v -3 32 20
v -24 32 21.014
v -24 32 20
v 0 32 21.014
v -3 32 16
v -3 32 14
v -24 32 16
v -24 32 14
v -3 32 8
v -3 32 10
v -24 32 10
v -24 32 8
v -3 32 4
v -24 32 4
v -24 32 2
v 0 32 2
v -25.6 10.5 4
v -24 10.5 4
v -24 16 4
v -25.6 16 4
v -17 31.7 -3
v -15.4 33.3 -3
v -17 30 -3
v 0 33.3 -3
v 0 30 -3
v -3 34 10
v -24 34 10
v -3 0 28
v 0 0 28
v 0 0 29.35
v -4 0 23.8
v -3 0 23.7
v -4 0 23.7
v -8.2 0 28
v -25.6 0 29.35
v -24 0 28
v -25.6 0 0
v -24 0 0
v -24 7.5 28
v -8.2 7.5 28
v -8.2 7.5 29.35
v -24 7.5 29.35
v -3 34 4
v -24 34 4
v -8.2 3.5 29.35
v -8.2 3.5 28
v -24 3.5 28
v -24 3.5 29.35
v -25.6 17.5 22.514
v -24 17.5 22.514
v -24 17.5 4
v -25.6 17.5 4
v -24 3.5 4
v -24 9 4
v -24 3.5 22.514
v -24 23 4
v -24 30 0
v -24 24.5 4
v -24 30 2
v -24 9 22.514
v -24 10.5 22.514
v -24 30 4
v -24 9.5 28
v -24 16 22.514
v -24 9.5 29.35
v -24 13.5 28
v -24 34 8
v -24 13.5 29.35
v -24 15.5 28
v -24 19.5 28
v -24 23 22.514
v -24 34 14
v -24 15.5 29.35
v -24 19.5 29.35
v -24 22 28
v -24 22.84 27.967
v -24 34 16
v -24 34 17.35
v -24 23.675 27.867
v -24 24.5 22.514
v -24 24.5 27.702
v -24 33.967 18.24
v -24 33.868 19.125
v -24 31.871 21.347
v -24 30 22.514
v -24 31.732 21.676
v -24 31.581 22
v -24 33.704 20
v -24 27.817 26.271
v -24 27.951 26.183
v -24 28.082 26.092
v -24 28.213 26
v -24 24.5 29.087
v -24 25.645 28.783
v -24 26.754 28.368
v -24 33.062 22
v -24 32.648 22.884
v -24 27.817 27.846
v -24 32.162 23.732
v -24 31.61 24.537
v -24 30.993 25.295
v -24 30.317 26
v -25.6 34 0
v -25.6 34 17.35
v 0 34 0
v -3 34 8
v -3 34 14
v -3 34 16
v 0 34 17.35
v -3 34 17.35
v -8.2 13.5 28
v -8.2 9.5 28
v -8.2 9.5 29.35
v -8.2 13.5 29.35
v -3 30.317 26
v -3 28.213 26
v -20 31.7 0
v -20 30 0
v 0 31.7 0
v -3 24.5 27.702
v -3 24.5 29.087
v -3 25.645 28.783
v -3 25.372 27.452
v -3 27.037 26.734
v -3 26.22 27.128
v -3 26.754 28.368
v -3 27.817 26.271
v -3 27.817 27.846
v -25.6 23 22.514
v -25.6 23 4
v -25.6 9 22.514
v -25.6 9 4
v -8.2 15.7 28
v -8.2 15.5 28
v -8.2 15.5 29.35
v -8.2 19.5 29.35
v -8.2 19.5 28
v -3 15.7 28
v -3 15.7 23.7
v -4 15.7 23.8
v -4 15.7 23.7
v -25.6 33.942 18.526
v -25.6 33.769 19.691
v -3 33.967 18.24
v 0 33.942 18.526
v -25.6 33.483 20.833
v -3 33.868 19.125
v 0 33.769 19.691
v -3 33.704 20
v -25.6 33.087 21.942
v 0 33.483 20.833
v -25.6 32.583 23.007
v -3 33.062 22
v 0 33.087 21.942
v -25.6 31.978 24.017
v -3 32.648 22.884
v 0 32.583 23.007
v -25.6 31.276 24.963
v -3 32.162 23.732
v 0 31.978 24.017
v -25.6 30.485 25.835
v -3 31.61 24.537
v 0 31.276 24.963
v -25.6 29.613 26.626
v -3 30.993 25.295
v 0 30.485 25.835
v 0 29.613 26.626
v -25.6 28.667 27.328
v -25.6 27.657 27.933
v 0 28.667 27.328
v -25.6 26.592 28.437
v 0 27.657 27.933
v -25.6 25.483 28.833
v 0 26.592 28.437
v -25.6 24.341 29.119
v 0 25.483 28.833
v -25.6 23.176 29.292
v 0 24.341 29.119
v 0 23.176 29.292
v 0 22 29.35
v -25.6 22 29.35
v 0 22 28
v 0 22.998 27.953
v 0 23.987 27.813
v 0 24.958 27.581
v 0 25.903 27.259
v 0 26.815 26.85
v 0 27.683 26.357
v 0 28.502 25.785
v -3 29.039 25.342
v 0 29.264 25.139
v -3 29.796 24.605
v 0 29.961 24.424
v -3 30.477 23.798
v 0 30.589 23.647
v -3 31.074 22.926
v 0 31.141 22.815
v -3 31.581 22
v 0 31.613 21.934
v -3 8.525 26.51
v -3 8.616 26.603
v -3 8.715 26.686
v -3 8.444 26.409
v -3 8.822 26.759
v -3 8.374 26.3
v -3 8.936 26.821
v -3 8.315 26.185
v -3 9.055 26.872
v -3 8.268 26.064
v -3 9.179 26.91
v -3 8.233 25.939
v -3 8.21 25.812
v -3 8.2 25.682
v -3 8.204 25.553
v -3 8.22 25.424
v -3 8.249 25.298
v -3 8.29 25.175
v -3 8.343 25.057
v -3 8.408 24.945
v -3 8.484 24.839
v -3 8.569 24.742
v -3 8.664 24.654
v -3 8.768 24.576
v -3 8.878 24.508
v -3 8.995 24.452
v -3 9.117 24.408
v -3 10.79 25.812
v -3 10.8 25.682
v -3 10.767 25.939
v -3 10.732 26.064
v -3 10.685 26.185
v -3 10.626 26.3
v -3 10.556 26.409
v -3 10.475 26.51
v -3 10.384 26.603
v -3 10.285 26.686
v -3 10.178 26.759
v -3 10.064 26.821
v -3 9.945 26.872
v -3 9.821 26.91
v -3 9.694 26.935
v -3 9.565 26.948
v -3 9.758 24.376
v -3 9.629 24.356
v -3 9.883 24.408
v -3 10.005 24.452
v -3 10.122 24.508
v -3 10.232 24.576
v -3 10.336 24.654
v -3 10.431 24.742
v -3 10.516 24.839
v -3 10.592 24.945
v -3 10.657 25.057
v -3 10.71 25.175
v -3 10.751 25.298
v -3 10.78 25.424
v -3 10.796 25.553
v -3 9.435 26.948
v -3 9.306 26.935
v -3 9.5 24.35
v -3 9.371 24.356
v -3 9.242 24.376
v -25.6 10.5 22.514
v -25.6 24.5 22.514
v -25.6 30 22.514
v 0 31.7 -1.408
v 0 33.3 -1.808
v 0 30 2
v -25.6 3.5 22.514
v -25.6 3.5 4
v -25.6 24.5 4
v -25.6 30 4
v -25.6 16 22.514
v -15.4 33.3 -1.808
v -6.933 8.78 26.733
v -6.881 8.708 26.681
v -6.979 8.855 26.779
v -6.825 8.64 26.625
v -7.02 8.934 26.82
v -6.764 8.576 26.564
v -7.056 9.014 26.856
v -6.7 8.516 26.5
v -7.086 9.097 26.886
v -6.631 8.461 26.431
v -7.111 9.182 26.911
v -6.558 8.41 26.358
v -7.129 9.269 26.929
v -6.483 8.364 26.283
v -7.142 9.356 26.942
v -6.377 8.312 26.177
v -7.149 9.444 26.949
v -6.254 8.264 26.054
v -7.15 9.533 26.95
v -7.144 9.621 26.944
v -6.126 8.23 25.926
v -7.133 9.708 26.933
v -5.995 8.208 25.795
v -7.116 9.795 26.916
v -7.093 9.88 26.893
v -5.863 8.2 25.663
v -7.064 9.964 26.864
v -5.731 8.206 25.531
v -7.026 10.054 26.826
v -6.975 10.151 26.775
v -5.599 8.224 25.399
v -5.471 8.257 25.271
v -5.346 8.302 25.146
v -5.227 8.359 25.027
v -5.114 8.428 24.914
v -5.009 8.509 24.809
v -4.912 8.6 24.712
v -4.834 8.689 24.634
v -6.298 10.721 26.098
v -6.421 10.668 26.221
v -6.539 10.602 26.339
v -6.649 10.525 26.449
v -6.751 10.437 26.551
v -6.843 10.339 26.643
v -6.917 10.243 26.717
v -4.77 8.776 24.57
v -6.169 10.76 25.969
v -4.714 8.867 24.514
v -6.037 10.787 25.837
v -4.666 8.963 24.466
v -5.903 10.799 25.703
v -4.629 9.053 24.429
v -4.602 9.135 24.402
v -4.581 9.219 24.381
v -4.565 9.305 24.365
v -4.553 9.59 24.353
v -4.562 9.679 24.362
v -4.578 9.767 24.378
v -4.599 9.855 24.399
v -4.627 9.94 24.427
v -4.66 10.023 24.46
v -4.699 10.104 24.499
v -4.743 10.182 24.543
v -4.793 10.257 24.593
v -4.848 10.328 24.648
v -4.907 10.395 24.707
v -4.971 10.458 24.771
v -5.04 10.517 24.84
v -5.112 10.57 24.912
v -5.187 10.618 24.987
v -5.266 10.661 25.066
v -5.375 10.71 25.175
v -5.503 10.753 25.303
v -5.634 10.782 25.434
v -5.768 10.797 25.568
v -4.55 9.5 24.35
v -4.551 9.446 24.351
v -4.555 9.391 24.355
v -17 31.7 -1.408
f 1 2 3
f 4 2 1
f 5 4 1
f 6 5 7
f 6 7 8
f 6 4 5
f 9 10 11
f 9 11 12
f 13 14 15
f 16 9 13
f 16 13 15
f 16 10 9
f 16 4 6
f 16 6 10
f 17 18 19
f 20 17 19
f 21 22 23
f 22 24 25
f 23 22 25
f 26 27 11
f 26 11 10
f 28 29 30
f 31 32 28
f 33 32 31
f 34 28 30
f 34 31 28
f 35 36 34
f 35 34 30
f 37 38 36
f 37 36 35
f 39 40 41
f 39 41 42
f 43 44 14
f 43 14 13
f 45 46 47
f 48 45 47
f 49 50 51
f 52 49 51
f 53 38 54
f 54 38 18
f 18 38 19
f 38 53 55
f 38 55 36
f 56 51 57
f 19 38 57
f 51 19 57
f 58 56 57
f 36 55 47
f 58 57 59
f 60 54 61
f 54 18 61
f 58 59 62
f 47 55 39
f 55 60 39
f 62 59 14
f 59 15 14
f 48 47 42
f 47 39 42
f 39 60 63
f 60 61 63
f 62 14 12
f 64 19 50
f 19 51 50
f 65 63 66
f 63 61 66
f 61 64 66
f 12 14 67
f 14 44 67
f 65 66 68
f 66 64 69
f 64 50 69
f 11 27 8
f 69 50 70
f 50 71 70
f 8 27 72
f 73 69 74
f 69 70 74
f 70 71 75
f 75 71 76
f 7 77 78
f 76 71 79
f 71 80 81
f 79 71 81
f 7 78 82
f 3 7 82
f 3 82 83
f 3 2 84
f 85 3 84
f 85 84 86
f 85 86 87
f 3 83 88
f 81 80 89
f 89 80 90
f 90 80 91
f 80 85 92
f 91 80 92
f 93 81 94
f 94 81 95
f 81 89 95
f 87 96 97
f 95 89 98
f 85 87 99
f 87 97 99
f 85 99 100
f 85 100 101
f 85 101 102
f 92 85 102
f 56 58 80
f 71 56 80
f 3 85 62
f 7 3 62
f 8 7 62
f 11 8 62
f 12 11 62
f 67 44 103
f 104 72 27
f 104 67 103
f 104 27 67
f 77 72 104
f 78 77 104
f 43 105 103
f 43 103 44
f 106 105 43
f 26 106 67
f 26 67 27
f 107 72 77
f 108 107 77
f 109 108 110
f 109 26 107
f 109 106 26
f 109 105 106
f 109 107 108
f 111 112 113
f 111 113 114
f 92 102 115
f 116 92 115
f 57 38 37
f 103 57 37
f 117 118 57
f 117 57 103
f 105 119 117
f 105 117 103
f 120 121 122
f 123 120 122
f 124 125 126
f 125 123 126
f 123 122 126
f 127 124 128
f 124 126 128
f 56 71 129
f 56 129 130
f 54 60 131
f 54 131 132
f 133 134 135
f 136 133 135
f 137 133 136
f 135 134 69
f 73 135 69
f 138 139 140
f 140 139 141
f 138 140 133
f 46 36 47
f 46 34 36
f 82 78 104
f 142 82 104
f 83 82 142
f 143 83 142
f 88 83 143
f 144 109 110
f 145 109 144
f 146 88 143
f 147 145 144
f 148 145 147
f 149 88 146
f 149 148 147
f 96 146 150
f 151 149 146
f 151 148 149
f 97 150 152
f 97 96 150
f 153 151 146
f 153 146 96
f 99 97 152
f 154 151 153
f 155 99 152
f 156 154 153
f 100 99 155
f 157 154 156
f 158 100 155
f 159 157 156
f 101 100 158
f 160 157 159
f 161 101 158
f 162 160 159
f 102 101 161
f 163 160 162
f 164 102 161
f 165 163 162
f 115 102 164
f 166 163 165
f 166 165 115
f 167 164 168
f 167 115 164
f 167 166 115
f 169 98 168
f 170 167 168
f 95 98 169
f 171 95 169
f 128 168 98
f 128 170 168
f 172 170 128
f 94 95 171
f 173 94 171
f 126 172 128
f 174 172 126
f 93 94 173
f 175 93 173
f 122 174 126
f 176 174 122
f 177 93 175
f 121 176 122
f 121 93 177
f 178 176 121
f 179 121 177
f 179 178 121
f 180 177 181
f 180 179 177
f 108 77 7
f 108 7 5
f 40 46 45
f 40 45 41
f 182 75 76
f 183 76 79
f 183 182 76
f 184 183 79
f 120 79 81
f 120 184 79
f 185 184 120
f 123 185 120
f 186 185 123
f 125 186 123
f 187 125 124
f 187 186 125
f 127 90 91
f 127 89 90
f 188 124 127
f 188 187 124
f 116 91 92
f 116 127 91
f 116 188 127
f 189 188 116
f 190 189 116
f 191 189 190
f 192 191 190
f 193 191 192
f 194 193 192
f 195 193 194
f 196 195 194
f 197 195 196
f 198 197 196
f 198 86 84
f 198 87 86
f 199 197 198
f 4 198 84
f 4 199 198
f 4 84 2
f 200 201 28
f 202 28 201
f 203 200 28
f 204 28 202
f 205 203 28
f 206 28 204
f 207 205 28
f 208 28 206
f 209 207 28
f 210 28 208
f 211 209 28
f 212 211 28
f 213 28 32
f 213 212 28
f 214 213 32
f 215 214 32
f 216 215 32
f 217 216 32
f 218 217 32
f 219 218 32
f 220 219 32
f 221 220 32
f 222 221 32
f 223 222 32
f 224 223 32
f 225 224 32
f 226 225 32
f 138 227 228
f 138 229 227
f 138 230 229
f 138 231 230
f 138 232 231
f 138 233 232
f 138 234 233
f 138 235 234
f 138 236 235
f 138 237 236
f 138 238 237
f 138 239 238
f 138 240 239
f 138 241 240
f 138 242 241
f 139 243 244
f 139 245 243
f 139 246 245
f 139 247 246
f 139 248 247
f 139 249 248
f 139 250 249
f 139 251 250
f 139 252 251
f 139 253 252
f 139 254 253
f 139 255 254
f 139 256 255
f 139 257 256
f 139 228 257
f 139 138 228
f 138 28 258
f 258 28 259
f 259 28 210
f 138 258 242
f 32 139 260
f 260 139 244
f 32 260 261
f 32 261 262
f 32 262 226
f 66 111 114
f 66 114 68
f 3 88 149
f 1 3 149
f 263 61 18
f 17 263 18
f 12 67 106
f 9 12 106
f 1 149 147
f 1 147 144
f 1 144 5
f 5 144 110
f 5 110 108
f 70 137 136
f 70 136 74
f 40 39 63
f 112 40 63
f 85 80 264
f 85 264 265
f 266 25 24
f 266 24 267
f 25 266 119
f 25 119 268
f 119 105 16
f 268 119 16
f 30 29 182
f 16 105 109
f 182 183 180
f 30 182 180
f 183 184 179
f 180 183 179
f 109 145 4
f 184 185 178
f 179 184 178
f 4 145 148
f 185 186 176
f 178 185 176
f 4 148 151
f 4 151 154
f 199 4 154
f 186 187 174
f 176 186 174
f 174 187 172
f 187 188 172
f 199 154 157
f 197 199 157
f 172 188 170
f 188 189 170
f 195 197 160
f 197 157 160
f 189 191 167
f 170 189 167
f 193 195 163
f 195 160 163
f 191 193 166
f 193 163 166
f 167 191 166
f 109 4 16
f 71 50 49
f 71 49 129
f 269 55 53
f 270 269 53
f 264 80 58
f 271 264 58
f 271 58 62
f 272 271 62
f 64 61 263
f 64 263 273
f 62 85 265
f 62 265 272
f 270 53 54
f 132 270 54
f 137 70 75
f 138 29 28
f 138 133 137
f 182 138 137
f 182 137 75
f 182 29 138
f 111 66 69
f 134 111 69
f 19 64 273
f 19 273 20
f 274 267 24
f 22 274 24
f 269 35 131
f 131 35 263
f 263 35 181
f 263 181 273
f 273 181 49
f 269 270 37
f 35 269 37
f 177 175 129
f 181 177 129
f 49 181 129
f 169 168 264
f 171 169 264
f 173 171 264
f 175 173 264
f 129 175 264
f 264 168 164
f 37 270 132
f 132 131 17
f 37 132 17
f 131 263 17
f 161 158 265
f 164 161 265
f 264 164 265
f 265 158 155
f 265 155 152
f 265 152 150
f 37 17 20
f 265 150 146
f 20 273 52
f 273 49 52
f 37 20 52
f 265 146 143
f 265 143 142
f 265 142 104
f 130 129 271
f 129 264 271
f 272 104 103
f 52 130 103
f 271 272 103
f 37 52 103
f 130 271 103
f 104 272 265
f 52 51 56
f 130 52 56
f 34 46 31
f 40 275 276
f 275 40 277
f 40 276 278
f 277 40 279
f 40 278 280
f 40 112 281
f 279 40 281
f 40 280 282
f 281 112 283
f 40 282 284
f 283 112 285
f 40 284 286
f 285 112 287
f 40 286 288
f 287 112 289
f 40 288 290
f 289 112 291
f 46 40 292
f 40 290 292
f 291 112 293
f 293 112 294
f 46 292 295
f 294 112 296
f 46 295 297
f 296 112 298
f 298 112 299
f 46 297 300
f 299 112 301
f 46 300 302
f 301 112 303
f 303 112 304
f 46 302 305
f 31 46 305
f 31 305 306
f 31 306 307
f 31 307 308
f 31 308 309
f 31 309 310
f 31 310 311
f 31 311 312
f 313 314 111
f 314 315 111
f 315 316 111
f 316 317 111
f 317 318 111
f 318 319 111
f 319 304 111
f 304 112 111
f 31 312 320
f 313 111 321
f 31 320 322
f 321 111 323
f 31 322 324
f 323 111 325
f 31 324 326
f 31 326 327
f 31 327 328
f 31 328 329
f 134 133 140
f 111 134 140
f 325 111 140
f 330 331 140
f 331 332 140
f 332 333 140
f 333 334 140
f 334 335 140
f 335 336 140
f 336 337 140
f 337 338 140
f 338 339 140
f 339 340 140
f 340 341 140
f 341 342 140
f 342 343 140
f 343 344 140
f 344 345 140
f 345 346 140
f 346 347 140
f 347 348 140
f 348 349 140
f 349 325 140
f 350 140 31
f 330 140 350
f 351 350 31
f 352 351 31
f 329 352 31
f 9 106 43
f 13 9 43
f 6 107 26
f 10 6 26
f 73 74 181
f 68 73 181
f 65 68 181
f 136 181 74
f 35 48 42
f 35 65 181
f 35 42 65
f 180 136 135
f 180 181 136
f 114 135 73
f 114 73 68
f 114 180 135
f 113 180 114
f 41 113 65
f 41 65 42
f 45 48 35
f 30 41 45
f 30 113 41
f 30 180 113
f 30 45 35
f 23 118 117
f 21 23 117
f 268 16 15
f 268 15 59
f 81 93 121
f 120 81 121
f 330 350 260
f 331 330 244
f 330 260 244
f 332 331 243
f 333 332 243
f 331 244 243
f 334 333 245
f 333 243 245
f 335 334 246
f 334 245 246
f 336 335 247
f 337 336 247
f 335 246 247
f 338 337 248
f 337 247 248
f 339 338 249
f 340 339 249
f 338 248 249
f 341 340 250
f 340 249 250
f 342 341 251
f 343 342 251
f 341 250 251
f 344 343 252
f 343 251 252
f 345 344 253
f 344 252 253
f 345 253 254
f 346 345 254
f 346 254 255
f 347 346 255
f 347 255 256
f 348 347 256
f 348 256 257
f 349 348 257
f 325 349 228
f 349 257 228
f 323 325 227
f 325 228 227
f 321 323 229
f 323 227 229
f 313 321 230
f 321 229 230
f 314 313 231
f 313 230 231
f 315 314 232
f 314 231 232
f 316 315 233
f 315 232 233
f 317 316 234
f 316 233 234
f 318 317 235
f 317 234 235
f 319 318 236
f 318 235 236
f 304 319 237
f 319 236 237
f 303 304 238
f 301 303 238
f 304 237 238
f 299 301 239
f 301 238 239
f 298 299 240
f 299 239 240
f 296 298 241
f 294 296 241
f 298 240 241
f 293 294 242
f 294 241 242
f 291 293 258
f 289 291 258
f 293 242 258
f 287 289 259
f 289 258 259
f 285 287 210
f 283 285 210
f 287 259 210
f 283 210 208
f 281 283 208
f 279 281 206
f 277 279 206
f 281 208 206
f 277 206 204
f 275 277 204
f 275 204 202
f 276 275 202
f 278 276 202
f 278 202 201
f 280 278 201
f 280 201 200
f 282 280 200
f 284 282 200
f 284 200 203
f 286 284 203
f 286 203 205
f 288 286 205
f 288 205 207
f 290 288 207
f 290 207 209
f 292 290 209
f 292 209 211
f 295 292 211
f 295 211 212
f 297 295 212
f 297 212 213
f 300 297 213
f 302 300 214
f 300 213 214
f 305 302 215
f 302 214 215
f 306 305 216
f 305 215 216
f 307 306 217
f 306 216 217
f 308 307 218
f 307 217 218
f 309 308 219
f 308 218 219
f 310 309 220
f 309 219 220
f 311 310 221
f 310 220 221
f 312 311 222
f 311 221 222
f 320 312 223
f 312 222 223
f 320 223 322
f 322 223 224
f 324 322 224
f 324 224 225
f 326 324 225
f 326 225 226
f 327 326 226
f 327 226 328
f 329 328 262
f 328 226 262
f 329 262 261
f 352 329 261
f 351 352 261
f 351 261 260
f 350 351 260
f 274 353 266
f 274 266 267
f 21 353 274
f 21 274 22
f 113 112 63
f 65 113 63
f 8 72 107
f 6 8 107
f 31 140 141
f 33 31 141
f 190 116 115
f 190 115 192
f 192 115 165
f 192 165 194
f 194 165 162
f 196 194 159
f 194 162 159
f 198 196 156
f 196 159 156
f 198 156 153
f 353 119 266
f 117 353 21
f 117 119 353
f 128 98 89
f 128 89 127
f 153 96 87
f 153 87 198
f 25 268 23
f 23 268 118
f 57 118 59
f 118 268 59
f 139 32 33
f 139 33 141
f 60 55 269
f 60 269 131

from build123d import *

# Parameters (mm, degrees)
BOSS_EXTRUDE1_DEPTH     = 25.6
SKETCH2_W               = 4.3
SKETCH2_H               = 15.7
CUT_EXTRUDE1_DEPTH      = 3
CUT_EXTRUDE2_REACH      = 52.281
SKETCH3_R               = 1.3
BOSS_EXTRUDE2_START     = -1.6
BOSS_EXTRUDE2_DEPTH     = 1.6
SKETCH6_W               = 20
SKETCH6_H               = 1.7
BOSS_EXTRUDE3_DEPTH     = 3
CHAMFER2_SIZE           = 3
BOSS_EXTRUDE5_DEPTH     = 17
CHAMFER3_SIZE           = 1.6
CUT_EXTRUDE3_REACH      = 52.926
SKETCH9_W               = 18.51367302
SKETCH9_H               = 5.5
LPATTERN1_COUNT         = 4
LPATTERN1_PITCH         = 7
CUT_EXTRUDE4_REACH      = 53.699
SKETCH10_W              = 21
SKETCH10_H              = 4
LPATTERN2_COUNT         = 4
LPATTERN2_PITCH         = 6
SKETCH11_W              = 4.3
SKETCH11_H              = 15.7
CUT_EXTRUDE5_DEPTH      = 20
CHAMFER4_SIZE           = 4.2
CUT_EXTRUDE6_REACH      = 54.653
SKETCH12_W              = 15.8
SKETCH12_H              = 4
LPATTERN3_COUNT         = 3
LPATTERN3_PITCH         = 6
CUT_EXTRUDE7_REACH      = 55.459
CUT_EXTRUDE7_END_RADIUS = 10.65
SKETCH13_W              = 21
SKETCH13_H              = 3.317301245


# Some blends are built 0.0001 mm under size
with BuildPart() as part:
    # Sketch1 → Boss-Extrude1 (new body)
    with BuildSketch(Plane(origin=(0, 0, 0), x_dir=(0, 0, -1), z_dir=(1, 0, 0))):
        with BuildLine():
            Line((-2, 32), (-2, 30))
            Line((-2, 30), (0, 30))
            Line((0, 30), (0, 34))
            Line((0, 34), (-17.35, 34))
            ThreePointArc((-17.35, 34), (-25.835281374, 30.485281374), (-29.35, 22))
            Line((-29.35, 22), (-29.35, 0))
            Line((-29.35, 0), (-23.7, 0))
            Line((-23.7, 0), (-23.7, 15.7))
            Line((-23.7, 15.7), (-28, 15.7))
            Line((-28, 15.7), (-28, 22))
            ThreePointArc((-28, 22), (-26.080424321, 28.099359898), (-21.01367302, 32))
            Line((-21.01367302, 32), (-2, 32))
        make_face()
    extrude(amount=-BOSS_EXTRUDE1_DEPTH)

    # Sketch2 → Cut-Extrude1 (cut)
    with BuildSketch(Plane(origin=(0, 0, 0), x_dir=(0, 0, -1), z_dir=(1, 0, 0))):
        with Locations((-25.85, 7.85)):
            Rectangle(SKETCH2_W, SKETCH2_H)
    extrude(amount=-CUT_EXTRUDE1_DEPTH, mode=Mode.SUBTRACT)

    # Sketch3 → Cut-Extrude2 (cut, up to next)
    with BuildSketch(Plane(origin=(-3, 0, 0), x_dir=(0, 0, -1), z_dir=(1, 0, 0)), mode=Mode.PRIVATE) as cut_extrude2_sk1:
        with Locations((-25.65, 9.5)):
            Circle(SKETCH3_R)
    cut_extrude2_tool1 = extrude(cut_extrude2_sk1.sketch, amount=-CUT_EXTRUDE2_REACH, mode=Mode.PRIVATE) & part.part
    add(cut_extrude2_tool1.solids().sort_by_distance((-3, 9.5, 25.65))[0], mode=Mode.SUBTRACT)

    # Sketch4 → Boss-Extrude2 (add)
    with BuildSketch(Plane.ZY.offset(25.6).offset(BOSS_EXTRUDE2_START)):
        with BuildLine():
            Line((0, 34), (0, 0))
            Line((0, 0), (29.35, 0))
            Line((29.35, 0), (29.35, 22))
            ThreePointArc((29.35, 22), (25.835281374, 30.485281374), (17.35, 34))
            Line((17.35, 34), (0, 34))
        make_face()
    extrude(amount=BOSS_EXTRUDE2_DEPTH)

    # Sketch6 → Boss-Extrude3 (add)
    with BuildSketch(Plane(origin=(0, 0, 0), x_dir=(-1, 0, 0), z_dir=(0, 0, -1))):
        with Locations((10, 30.85)):
            Rectangle(SKETCH6_W, SKETCH6_H)
    extrude(amount=BOSS_EXTRUDE3_DEPTH)

    # Chamfer2
    chamfer2_edges = [part.edges().sort_by_distance(p)[0] for p in [
        (-20, 30.85, -3),
    ]]
    chamfer(chamfer2_edges, length=CHAMFER2_SIZE - 0.0001)  # a hair under: the kernel refuses the full size

    # Sketch8 → Boss-Extrude5 (add)
    with BuildSketch(Plane.ZY):
        Polygon((-1.408034607, 31.7), (-1.808034607, 33.3), (-3, 33.3), (-3, 31.7), align=None)
    extrude(amount=BOSS_EXTRUDE5_DEPTH)

    # Chamfer3
    chamfer3_edges = [part.edges().sort_by_distance(p)[0] for p in [
        (-17, 33.3, -2.404017304),
    ]]
    chamfer(chamfer3_edges, length=CHAMFER3_SIZE - 0.0001)  # a hair under: the kernel refuses the full size

    # Sketch9 → Cut-Extrude3 (cut, up to next)
    with BuildSketch(Plane(origin=(-24, 0, 0), x_dir=(0, 0, -1), z_dir=(1, 0, 0)), mode=Mode.PRIVATE) as cut_extrude3_sk1:
        with Locations((-13.25683651, 27.25)):
            Rectangle(SKETCH9_W, SKETCH9_H)
    cut_extrude3_tool1 = extrude(cut_extrude3_sk1.sketch, amount=-CUT_EXTRUDE3_REACH, mode=Mode.PRIVATE) & part.part
    cut_extrude3 = cut_extrude3_tool1.solids().sort_by_distance((-24, 27.25, 13.256837))[0]
    add(cut_extrude3, mode=Mode.SUBTRACT)

    # LPattern1: Cut-Extrude3 ×4
    with Locations(*[(0, -i * LPATTERN1_PITCH, 0) for i in range(1, LPATTERN1_COUNT)]):
        add(cut_extrude3, mode=Mode.SUBTRACT)

    # Sketch10 → Cut-Extrude4 (cut, up to next)
    with BuildSketch(Plane(origin=(0, 34, 0), x_dir=(1, 0, 0), z_dir=(0, 1, 0)), mode=Mode.PRIVATE) as cut_extrude4_sk1:
        with Locations((-13.5, -6)):
            Rectangle(SKETCH10_W, SKETCH10_H)
    cut_extrude4_tool1 = extrude(cut_extrude4_sk1.sketch, amount=-CUT_EXTRUDE4_REACH, mode=Mode.PRIVATE) & part.part
    cut_extrude4 = cut_extrude4_tool1.solids().sort_by_distance((-13.5, 34, 6))[0]
    add(cut_extrude4, mode=Mode.SUBTRACT)

    # LPattern2: Cut-Extrude4; each copy of Cut-Extrude4 runs up to whatever stops it at its own place
    lpattern2_before = part.part  # the part as the pattern finds it: every copy runs up to it
    lpattern2_cut_extrude4_long = extrude(cut_extrude4_sk1.sketch, amount=-CUT_EXTRUDE4_REACH, mode=Mode.PRIVATE)
    lpattern2_cut_extrude4_tool1 = lpattern2_cut_extrude4_long.moved(Location(Vector(0, 0, 1) * (1 * LPATTERN2_PITCH))) & lpattern2_before
    add(lpattern2_cut_extrude4_tool1.solids().sort_by_distance((-13.5, 34, 12))[0], mode=Mode.SUBTRACT)
    lpattern2_cut_extrude4_tool2 = lpattern2_cut_extrude4_long.moved(Location(Vector(0, 0, 1) * (2 * LPATTERN2_PITCH))) & lpattern2_before
    add(lpattern2_cut_extrude4_tool2.solids().sort_by_distance((-13.5, 34, 18))[0], mode=Mode.SUBTRACT)
    lpattern2_cut_extrude4_tool3 = lpattern2_cut_extrude4_long.moved(Location(Vector(0, 0, 1) * (3 * LPATTERN2_PITCH))) & lpattern2_before
    add(lpattern2_cut_extrude4_tool3.solids().sort_by_distance((-13.5, 34, 24))[0], mode=Mode.SUBTRACT)

    # Sketch11 → Cut-Extrude5 (cut)
    with BuildSketch(Plane(origin=(-24, 0, 0), x_dir=(0, 0, -1), z_dir=(1, 0, 0))):
        with Locations((-25.85, 7.85)):
            Rectangle(SKETCH11_W, SKETCH11_H)
    extrude(amount=CUT_EXTRUDE5_DEPTH, mode=Mode.SUBTRACT)

    # Chamfer4
    # the kernel refuses this chamfer: 4.2 mm, written as the material it adds along each edge
    with BuildSketch(Plane(origin=(-4, 15.7, 28), x_dir=(-0.9996219169112966, 0, 0.02749587661058612), z_dir=(0, -1, 0))) as chamfer4_piece_1_section:
        Polygon((CHAMFER4_SIZE * 0.999621916911, CHAMFER4_SIZE * 0.0274958766106), (-CHAMFER4_SIZE * 0.0274958766106, CHAMFER4_SIZE * 0.999621916911), (0, 0), align=None)
    chamfer4_piece_1 = extrude(amount=15.7, mode=Mode.PRIVATE)
    chamfer4_piece_1 = chamfer4_piece_1 - Plane(origin=(-5.414149403, 9.5, 25.65), x_dir=(0, 0, -1), z_dir=(1, 0, 0)) * Cylinder(1.3, 49, mode=Mode.PRIVATE)
    add(chamfer4_piece_1)

    # Sketch12 → Cut-Extrude6 (cut, up to next)
    with BuildSketch(Plane(origin=(0, 0, 28), x_dir=(-1, 0, 0), z_dir=(0, 0, -1)), mode=Mode.PRIVATE) as cut_extrude6_sk1:
        with Locations((16.1, 5.5)):
            Rectangle(SKETCH12_W, SKETCH12_H)
    cut_extrude6_tool1 = extrude(cut_extrude6_sk1.sketch, amount=-CUT_EXTRUDE6_REACH, mode=Mode.PRIVATE) & part.part
    cut_extrude6 = cut_extrude6_tool1.solids().sort_by_distance((-16.1, 5.5, 28))[0]
    add(cut_extrude6, mode=Mode.SUBTRACT)

    # LPattern3: Cut-Extrude6 ×3
    with Locations(*[(0, i * LPATTERN3_PITCH, 0) for i in range(1, LPATTERN3_COUNT)]):
        add(cut_extrude6, mode=Mode.SUBTRACT)

    # Cut-Extrude7: up to this cylinder (the profile starts outside it)
    cut_extrude7_end = Plane(origin=(-13.5, 22, 17.35), z_dir=(1, 0, 0)) * Cylinder(CUT_EXTRUDE7_END_RADIUS, 133.218, mode=Mode.PRIVATE)
    # Sketch13 → Cut-Extrude7 (cut, up to the surface)
    with BuildSketch(Plane.XY.offset(29.35), mode=Mode.PRIVATE) as cut_extrude7_sk1:
        with Locations((-13.5, 26.158650623)):
            Rectangle(SKETCH13_W, SKETCH13_H)
    cut_extrude7_tool1 = extrude(cut_extrude7_sk1.sketch, amount=-CUT_EXTRUDE7_REACH, mode=Mode.PRIVATE) - cut_extrude7_end
    add(cut_extrude7_tool1.solids().sort_by_distance((-13.5, 26.158651, 29.35))[0], mode=Mode.SUBTRACT)


solid = part.part
